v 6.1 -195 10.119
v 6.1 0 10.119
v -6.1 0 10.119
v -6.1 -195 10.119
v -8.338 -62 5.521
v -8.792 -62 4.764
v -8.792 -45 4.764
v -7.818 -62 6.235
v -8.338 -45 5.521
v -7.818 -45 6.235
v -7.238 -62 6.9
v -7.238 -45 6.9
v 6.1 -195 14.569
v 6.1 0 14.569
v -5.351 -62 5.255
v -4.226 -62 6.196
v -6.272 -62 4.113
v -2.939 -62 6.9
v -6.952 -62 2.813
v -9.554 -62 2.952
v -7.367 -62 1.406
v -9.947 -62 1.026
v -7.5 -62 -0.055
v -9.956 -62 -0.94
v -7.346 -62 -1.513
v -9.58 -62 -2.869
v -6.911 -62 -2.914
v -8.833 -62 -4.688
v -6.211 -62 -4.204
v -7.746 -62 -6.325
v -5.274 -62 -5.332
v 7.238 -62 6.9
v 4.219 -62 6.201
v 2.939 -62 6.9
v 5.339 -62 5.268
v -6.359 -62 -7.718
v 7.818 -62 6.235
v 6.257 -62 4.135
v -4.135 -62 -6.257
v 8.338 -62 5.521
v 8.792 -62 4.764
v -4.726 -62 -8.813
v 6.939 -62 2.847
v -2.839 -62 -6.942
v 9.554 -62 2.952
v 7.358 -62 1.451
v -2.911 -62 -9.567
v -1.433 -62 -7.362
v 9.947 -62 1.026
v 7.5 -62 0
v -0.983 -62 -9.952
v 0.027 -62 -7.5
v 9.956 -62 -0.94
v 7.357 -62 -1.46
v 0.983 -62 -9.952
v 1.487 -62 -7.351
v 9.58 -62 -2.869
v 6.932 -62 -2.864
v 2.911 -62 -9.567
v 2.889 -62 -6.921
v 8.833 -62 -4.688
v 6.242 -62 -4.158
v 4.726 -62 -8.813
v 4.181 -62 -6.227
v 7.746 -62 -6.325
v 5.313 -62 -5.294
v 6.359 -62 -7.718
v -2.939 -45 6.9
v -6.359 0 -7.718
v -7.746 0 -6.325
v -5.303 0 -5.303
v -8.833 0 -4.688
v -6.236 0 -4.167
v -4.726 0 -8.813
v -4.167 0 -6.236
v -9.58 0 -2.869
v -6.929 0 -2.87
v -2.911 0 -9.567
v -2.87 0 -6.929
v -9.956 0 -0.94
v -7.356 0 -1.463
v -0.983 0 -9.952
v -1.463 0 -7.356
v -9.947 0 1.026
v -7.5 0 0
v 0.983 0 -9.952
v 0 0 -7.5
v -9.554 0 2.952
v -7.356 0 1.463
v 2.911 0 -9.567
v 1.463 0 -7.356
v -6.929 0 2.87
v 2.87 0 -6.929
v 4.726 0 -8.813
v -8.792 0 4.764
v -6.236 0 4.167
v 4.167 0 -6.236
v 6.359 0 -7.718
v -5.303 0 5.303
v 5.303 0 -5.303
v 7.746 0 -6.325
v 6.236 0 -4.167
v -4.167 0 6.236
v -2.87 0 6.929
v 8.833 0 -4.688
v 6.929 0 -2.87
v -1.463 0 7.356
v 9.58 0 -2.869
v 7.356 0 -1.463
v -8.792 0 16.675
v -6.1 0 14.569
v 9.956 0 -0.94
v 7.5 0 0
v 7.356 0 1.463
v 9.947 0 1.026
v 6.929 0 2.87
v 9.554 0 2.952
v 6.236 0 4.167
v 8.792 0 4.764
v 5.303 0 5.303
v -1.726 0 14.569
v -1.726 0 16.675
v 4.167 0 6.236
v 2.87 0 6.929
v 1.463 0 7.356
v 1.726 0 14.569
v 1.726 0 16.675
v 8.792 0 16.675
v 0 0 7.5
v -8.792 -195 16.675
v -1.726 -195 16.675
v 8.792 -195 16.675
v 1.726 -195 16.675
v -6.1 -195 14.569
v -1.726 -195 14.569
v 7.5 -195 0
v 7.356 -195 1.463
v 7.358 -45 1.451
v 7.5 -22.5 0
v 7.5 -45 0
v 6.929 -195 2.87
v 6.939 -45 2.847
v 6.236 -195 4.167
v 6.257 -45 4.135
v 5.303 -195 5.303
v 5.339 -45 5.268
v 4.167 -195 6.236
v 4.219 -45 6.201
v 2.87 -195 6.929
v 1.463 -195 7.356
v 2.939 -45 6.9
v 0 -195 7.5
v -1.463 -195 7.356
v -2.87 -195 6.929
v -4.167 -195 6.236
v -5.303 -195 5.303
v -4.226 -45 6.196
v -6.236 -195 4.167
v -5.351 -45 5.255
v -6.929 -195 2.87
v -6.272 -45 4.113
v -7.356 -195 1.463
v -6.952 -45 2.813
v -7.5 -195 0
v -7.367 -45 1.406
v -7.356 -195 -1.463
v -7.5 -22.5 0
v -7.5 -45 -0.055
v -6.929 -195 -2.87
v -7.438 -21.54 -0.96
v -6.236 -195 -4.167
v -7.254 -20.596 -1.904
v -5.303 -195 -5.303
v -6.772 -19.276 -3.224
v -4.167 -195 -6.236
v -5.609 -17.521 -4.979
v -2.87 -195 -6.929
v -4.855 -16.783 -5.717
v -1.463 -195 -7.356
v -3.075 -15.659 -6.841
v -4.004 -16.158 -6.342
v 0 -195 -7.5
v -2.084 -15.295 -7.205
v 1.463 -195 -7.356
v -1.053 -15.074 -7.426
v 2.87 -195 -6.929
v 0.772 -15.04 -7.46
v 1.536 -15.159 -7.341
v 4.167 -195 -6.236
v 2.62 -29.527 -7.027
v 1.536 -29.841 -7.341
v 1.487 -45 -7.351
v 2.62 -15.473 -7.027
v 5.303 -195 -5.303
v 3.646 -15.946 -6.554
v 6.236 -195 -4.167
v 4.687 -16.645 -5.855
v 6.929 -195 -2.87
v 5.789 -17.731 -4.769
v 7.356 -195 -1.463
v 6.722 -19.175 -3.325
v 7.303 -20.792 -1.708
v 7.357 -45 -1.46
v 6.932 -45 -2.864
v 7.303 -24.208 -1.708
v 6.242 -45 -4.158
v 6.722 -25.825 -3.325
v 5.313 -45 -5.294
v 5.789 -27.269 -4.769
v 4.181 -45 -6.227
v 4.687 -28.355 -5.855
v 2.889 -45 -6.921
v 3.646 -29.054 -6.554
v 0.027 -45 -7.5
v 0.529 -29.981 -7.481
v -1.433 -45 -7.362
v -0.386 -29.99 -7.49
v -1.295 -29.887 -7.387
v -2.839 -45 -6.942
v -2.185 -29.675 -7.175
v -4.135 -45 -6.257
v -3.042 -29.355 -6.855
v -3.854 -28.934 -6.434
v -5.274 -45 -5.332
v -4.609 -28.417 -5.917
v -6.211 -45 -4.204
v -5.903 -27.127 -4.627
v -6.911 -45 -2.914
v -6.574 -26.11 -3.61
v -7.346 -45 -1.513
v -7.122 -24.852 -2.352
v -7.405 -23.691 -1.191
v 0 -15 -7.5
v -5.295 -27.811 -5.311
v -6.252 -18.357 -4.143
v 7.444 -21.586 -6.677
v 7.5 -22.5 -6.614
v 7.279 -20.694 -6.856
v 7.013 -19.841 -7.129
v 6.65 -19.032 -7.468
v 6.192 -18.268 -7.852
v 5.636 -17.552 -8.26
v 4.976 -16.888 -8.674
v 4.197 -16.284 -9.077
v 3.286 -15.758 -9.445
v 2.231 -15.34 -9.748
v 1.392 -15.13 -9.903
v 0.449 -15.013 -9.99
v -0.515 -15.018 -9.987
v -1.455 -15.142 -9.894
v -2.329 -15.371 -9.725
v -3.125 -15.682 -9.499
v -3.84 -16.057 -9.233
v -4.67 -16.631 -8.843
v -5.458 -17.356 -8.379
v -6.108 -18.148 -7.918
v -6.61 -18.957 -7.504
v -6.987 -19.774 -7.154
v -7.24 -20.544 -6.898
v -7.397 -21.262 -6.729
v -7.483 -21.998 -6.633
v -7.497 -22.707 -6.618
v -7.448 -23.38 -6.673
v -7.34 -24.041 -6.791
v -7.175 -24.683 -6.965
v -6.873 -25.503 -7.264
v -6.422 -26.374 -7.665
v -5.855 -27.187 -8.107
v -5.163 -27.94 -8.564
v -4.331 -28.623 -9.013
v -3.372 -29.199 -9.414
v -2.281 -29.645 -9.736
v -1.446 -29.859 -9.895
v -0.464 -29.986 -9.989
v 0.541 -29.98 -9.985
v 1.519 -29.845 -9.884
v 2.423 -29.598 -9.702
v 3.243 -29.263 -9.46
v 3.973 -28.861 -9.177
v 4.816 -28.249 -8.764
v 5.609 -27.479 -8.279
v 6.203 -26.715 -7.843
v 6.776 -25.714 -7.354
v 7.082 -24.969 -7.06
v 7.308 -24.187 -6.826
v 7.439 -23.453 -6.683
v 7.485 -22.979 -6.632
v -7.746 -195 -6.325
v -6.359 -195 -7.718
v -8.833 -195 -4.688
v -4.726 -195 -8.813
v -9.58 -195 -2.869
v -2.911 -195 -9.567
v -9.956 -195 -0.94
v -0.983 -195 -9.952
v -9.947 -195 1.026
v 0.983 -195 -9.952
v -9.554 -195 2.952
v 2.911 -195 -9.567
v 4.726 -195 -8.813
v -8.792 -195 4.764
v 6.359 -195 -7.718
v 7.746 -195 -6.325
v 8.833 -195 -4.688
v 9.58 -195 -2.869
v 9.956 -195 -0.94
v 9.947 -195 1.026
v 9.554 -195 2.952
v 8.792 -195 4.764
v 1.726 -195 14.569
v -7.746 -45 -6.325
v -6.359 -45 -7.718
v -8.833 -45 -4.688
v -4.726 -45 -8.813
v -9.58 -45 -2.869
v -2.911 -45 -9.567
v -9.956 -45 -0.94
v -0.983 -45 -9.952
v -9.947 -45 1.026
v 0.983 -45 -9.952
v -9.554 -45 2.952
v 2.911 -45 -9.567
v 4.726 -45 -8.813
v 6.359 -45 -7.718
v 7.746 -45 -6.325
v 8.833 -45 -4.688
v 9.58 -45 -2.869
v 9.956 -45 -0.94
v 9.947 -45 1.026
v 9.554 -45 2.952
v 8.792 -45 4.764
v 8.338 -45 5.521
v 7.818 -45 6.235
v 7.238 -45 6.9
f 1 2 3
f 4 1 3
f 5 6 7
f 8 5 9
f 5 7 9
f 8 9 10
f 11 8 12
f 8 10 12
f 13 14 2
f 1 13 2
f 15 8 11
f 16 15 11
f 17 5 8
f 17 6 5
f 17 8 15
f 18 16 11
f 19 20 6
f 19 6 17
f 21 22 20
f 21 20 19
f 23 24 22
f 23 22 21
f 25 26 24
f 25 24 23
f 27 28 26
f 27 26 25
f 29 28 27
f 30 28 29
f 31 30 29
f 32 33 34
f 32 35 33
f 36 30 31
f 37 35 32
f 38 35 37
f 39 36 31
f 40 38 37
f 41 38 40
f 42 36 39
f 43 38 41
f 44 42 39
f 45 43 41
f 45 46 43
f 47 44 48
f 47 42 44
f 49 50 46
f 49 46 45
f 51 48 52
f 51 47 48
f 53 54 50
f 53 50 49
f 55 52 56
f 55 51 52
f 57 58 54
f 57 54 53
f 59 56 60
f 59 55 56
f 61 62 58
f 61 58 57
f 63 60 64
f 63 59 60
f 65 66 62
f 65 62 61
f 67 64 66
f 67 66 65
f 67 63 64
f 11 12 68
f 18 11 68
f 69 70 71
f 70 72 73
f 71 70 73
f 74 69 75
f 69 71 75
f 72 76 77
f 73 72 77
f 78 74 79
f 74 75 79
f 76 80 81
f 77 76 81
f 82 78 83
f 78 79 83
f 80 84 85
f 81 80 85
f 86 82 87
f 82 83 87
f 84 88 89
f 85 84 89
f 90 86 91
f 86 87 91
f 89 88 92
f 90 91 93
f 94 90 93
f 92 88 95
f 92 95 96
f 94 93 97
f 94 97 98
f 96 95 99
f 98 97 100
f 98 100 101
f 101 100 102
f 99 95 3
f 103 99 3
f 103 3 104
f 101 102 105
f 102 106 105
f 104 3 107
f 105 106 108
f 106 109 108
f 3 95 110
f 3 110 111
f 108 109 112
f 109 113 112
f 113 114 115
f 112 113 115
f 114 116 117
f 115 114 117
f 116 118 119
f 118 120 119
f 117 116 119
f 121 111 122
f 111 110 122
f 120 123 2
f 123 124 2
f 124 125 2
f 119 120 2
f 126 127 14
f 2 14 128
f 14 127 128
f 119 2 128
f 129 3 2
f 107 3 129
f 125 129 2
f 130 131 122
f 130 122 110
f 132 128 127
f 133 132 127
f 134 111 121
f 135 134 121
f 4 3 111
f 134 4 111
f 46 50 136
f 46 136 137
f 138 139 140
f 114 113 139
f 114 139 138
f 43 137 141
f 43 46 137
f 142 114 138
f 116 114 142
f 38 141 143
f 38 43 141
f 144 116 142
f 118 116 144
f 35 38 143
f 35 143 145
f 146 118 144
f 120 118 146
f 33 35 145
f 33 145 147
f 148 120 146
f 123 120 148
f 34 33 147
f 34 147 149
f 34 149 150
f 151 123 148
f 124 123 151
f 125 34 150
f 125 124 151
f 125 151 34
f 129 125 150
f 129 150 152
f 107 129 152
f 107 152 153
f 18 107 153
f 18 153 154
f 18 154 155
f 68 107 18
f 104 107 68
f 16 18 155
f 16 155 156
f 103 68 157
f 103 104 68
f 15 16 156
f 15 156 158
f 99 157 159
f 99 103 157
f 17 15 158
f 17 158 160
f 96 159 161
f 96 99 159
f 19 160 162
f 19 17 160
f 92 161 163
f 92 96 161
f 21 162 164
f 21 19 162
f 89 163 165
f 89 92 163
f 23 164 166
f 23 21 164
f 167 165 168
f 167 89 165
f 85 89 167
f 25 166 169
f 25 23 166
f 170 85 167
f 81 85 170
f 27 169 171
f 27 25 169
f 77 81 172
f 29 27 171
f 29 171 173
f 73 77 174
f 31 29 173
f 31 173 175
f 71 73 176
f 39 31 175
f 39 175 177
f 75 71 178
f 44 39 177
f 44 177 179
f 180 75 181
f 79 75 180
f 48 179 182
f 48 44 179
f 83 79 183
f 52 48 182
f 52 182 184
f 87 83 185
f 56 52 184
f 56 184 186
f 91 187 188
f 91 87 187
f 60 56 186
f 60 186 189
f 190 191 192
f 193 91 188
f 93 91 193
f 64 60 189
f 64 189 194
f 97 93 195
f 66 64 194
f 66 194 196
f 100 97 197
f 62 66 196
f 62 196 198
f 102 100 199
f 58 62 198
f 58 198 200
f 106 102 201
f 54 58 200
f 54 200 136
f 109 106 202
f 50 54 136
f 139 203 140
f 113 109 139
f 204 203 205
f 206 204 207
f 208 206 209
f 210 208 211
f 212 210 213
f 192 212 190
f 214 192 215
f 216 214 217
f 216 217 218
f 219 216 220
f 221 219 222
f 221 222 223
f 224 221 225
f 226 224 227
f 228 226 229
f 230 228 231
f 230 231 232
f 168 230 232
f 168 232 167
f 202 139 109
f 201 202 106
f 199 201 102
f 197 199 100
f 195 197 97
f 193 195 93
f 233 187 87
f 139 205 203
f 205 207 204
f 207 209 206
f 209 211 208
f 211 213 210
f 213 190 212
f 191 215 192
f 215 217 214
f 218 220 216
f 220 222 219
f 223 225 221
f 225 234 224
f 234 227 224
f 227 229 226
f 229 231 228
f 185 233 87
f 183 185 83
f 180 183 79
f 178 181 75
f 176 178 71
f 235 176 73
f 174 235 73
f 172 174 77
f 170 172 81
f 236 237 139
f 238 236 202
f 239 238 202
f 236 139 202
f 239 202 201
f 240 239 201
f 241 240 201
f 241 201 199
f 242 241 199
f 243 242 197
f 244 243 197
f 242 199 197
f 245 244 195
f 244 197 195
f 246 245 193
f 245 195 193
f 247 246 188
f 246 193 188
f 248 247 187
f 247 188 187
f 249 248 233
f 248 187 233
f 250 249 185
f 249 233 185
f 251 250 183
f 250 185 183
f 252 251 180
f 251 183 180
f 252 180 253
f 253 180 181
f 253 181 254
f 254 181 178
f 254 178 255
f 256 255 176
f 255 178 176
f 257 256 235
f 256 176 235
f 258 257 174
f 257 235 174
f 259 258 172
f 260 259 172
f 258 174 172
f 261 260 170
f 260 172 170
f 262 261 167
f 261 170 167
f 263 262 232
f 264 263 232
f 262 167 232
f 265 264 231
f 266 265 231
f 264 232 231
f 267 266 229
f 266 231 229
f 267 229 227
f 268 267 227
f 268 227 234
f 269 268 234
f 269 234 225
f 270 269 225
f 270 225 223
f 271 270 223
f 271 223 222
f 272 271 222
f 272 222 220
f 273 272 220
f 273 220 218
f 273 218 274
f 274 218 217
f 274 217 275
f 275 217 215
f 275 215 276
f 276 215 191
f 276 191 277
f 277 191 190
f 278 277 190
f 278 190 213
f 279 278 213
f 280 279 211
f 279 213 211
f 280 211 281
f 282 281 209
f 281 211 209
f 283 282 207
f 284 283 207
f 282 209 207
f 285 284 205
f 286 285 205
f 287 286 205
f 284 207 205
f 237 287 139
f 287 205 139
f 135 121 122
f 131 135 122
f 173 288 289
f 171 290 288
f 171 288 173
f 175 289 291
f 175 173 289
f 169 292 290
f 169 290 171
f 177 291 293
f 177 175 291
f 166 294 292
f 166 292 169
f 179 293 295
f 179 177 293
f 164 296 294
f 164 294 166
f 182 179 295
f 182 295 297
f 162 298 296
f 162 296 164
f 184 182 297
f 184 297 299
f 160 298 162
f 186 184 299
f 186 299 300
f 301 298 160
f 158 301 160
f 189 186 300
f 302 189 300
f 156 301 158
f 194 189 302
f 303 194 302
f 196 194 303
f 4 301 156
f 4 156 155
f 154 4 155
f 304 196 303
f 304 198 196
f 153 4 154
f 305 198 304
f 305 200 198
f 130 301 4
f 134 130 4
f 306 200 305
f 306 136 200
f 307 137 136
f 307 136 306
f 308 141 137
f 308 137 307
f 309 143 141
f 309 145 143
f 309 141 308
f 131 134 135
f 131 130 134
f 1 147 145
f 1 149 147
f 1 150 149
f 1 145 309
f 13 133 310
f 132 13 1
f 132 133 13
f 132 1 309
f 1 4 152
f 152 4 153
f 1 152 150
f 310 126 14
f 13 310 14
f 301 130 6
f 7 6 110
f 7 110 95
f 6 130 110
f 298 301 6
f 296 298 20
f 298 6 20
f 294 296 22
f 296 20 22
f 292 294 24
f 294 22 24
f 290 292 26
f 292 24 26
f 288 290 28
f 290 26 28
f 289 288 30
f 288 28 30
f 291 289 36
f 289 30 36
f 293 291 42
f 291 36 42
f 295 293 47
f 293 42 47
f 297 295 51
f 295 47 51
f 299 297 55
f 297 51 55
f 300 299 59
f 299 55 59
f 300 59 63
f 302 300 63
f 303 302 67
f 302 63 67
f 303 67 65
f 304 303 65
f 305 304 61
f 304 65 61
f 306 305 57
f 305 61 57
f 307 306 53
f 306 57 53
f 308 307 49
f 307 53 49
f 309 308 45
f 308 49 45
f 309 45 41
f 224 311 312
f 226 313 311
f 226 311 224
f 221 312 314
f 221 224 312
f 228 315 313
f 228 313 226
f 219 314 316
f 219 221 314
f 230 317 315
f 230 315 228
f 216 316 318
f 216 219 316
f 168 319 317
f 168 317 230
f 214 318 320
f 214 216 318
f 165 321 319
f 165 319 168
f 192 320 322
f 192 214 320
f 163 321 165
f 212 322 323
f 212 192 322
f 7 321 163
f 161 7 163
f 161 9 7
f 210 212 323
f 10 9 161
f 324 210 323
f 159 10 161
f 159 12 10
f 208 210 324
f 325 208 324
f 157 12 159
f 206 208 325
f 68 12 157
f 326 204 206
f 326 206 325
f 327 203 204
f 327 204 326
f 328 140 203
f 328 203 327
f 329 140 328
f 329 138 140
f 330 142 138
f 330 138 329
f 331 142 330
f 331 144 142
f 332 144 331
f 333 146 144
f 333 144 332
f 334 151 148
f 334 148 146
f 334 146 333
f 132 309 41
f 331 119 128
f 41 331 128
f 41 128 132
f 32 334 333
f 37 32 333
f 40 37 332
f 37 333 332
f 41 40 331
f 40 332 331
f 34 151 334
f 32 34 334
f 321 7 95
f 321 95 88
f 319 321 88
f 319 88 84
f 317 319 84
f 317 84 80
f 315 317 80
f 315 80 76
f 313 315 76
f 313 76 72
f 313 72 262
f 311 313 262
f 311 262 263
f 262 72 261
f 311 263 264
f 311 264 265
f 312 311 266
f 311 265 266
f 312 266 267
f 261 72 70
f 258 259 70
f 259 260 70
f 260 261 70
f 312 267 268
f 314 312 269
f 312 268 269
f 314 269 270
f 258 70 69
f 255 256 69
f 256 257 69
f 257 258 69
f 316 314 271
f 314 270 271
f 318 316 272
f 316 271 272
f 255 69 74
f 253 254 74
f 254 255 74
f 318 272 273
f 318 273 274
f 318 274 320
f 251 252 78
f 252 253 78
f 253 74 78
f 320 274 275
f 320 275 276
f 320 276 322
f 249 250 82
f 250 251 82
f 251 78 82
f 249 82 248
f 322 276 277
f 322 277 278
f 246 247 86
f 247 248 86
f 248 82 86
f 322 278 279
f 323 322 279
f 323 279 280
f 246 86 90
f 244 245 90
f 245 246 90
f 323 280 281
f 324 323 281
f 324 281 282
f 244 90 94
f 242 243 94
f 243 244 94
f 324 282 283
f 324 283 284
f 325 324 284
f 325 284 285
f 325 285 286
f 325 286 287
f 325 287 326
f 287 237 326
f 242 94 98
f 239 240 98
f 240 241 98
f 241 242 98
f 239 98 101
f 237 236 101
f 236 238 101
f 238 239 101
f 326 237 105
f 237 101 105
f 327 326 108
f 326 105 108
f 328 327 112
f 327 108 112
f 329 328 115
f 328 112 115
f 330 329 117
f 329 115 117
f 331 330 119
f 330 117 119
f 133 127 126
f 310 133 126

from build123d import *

# Parameters (mm, degrees)
F0_R     = 10
F0_R_2   = 7.5
F1_DEPTH = 195
F2_R     = 7.5
F3_DEPTH = 25
F4_W     = 25.85132
F4_H     = 17
F5_DEPTH = 25
F6_DEPTH = 6.9
F8_DEPTH = 195


with BuildPart() as f1:
    # F0 (on Front) → F1 (new body)
    with BuildSketch(Plane.XZ):
        Circle(F0_R)
        Circle(F0_R_2, mode=Mode.SUBTRACT)
    extrude(amount=F1_DEPTH)

    # F2 (on Top) → F3 (cut)
    with BuildSketch(Plane.XY):
        with Locations((0, -22.5)):
            Circle(F2_R)
    extrude(amount=-F3_DEPTH, mode=Mode.SUBTRACT)

    # F4 (on Top) → F5 (cut)
    with BuildSketch(Plane.XY):
        with Locations((0, -53.5)):
            Rectangle(F4_W, F4_H)
    extrude(amount=-F5_DEPTH, mode=Mode.SUBTRACT)

    # F4 (on Top) → F6 (cut)
    with BuildSketch(Plane.XY):
        with Locations((0, -53.5)):
            Rectangle(F4_W, F4_H)
    extrude(amount=F6_DEPTH, mode=Mode.SUBTRACT)

    # F7 (on Front) → F8 (join)
    with BuildSketch(Plane.XZ):
        with BuildLine():
            ThreePointArc((6.1, 7.924014), (7.611905, 6.485284), (8.79225, 4.764068))
            Line((8.79225, 4.764068), (8.79225, 5.520866))
            Line((8.79225, 5.520866), (8.79225, 16.675162))
            Line((8.79225, 16.675162), (1.726435, 16.675162))
            Line((1.726435, 16.675162), (1.726435, 14.56902))
            Line((1.726435, 14.56902), (6.1, 14.56902))
            Line((6.1, 14.56902), (6.1, 10.11902))
            Line((6.1, 10.11902), (6.1, 7.924014))
        make_face()
        with BuildLine():
            Line((-8.79225, 5.520866), (-8.79225, 4.764068))
            ThreePointArc((-8.79225, 4.764068), (-7.611905, 6.485284), (-6.1, 7.924014))
            Line((-6.1, 7.924014), (-6.1, 10.11902))
            Line((-6.1, 10.11902), (-6.1, 14.56902))
            Line((-6.1, 14.56902), (-1.726435, 14.56902))
            Line((-1.726435, 14.56902), (-1.726435, 16.675162))
            Line((-1.726435, 16.675162), (-8.79225, 16.675162))
            Line((-8.79225, 16.675162), (-8.79225, 5.520866))
        make_face()
        with BuildLine():
            Line((-6.1, 10.11902), (-6.1, 7.924014))
            ThreePointArc((-6.1, 7.924014), (0, 10), (6.1, 7.924014))
            Line((6.1, 7.924014), (6.1, 10.11902))
            Line((6.1, 10.11902), (-6.1, 10.11902))
        make_face()
    extrude(amount=F8_DEPTH)


solid = f1.part
